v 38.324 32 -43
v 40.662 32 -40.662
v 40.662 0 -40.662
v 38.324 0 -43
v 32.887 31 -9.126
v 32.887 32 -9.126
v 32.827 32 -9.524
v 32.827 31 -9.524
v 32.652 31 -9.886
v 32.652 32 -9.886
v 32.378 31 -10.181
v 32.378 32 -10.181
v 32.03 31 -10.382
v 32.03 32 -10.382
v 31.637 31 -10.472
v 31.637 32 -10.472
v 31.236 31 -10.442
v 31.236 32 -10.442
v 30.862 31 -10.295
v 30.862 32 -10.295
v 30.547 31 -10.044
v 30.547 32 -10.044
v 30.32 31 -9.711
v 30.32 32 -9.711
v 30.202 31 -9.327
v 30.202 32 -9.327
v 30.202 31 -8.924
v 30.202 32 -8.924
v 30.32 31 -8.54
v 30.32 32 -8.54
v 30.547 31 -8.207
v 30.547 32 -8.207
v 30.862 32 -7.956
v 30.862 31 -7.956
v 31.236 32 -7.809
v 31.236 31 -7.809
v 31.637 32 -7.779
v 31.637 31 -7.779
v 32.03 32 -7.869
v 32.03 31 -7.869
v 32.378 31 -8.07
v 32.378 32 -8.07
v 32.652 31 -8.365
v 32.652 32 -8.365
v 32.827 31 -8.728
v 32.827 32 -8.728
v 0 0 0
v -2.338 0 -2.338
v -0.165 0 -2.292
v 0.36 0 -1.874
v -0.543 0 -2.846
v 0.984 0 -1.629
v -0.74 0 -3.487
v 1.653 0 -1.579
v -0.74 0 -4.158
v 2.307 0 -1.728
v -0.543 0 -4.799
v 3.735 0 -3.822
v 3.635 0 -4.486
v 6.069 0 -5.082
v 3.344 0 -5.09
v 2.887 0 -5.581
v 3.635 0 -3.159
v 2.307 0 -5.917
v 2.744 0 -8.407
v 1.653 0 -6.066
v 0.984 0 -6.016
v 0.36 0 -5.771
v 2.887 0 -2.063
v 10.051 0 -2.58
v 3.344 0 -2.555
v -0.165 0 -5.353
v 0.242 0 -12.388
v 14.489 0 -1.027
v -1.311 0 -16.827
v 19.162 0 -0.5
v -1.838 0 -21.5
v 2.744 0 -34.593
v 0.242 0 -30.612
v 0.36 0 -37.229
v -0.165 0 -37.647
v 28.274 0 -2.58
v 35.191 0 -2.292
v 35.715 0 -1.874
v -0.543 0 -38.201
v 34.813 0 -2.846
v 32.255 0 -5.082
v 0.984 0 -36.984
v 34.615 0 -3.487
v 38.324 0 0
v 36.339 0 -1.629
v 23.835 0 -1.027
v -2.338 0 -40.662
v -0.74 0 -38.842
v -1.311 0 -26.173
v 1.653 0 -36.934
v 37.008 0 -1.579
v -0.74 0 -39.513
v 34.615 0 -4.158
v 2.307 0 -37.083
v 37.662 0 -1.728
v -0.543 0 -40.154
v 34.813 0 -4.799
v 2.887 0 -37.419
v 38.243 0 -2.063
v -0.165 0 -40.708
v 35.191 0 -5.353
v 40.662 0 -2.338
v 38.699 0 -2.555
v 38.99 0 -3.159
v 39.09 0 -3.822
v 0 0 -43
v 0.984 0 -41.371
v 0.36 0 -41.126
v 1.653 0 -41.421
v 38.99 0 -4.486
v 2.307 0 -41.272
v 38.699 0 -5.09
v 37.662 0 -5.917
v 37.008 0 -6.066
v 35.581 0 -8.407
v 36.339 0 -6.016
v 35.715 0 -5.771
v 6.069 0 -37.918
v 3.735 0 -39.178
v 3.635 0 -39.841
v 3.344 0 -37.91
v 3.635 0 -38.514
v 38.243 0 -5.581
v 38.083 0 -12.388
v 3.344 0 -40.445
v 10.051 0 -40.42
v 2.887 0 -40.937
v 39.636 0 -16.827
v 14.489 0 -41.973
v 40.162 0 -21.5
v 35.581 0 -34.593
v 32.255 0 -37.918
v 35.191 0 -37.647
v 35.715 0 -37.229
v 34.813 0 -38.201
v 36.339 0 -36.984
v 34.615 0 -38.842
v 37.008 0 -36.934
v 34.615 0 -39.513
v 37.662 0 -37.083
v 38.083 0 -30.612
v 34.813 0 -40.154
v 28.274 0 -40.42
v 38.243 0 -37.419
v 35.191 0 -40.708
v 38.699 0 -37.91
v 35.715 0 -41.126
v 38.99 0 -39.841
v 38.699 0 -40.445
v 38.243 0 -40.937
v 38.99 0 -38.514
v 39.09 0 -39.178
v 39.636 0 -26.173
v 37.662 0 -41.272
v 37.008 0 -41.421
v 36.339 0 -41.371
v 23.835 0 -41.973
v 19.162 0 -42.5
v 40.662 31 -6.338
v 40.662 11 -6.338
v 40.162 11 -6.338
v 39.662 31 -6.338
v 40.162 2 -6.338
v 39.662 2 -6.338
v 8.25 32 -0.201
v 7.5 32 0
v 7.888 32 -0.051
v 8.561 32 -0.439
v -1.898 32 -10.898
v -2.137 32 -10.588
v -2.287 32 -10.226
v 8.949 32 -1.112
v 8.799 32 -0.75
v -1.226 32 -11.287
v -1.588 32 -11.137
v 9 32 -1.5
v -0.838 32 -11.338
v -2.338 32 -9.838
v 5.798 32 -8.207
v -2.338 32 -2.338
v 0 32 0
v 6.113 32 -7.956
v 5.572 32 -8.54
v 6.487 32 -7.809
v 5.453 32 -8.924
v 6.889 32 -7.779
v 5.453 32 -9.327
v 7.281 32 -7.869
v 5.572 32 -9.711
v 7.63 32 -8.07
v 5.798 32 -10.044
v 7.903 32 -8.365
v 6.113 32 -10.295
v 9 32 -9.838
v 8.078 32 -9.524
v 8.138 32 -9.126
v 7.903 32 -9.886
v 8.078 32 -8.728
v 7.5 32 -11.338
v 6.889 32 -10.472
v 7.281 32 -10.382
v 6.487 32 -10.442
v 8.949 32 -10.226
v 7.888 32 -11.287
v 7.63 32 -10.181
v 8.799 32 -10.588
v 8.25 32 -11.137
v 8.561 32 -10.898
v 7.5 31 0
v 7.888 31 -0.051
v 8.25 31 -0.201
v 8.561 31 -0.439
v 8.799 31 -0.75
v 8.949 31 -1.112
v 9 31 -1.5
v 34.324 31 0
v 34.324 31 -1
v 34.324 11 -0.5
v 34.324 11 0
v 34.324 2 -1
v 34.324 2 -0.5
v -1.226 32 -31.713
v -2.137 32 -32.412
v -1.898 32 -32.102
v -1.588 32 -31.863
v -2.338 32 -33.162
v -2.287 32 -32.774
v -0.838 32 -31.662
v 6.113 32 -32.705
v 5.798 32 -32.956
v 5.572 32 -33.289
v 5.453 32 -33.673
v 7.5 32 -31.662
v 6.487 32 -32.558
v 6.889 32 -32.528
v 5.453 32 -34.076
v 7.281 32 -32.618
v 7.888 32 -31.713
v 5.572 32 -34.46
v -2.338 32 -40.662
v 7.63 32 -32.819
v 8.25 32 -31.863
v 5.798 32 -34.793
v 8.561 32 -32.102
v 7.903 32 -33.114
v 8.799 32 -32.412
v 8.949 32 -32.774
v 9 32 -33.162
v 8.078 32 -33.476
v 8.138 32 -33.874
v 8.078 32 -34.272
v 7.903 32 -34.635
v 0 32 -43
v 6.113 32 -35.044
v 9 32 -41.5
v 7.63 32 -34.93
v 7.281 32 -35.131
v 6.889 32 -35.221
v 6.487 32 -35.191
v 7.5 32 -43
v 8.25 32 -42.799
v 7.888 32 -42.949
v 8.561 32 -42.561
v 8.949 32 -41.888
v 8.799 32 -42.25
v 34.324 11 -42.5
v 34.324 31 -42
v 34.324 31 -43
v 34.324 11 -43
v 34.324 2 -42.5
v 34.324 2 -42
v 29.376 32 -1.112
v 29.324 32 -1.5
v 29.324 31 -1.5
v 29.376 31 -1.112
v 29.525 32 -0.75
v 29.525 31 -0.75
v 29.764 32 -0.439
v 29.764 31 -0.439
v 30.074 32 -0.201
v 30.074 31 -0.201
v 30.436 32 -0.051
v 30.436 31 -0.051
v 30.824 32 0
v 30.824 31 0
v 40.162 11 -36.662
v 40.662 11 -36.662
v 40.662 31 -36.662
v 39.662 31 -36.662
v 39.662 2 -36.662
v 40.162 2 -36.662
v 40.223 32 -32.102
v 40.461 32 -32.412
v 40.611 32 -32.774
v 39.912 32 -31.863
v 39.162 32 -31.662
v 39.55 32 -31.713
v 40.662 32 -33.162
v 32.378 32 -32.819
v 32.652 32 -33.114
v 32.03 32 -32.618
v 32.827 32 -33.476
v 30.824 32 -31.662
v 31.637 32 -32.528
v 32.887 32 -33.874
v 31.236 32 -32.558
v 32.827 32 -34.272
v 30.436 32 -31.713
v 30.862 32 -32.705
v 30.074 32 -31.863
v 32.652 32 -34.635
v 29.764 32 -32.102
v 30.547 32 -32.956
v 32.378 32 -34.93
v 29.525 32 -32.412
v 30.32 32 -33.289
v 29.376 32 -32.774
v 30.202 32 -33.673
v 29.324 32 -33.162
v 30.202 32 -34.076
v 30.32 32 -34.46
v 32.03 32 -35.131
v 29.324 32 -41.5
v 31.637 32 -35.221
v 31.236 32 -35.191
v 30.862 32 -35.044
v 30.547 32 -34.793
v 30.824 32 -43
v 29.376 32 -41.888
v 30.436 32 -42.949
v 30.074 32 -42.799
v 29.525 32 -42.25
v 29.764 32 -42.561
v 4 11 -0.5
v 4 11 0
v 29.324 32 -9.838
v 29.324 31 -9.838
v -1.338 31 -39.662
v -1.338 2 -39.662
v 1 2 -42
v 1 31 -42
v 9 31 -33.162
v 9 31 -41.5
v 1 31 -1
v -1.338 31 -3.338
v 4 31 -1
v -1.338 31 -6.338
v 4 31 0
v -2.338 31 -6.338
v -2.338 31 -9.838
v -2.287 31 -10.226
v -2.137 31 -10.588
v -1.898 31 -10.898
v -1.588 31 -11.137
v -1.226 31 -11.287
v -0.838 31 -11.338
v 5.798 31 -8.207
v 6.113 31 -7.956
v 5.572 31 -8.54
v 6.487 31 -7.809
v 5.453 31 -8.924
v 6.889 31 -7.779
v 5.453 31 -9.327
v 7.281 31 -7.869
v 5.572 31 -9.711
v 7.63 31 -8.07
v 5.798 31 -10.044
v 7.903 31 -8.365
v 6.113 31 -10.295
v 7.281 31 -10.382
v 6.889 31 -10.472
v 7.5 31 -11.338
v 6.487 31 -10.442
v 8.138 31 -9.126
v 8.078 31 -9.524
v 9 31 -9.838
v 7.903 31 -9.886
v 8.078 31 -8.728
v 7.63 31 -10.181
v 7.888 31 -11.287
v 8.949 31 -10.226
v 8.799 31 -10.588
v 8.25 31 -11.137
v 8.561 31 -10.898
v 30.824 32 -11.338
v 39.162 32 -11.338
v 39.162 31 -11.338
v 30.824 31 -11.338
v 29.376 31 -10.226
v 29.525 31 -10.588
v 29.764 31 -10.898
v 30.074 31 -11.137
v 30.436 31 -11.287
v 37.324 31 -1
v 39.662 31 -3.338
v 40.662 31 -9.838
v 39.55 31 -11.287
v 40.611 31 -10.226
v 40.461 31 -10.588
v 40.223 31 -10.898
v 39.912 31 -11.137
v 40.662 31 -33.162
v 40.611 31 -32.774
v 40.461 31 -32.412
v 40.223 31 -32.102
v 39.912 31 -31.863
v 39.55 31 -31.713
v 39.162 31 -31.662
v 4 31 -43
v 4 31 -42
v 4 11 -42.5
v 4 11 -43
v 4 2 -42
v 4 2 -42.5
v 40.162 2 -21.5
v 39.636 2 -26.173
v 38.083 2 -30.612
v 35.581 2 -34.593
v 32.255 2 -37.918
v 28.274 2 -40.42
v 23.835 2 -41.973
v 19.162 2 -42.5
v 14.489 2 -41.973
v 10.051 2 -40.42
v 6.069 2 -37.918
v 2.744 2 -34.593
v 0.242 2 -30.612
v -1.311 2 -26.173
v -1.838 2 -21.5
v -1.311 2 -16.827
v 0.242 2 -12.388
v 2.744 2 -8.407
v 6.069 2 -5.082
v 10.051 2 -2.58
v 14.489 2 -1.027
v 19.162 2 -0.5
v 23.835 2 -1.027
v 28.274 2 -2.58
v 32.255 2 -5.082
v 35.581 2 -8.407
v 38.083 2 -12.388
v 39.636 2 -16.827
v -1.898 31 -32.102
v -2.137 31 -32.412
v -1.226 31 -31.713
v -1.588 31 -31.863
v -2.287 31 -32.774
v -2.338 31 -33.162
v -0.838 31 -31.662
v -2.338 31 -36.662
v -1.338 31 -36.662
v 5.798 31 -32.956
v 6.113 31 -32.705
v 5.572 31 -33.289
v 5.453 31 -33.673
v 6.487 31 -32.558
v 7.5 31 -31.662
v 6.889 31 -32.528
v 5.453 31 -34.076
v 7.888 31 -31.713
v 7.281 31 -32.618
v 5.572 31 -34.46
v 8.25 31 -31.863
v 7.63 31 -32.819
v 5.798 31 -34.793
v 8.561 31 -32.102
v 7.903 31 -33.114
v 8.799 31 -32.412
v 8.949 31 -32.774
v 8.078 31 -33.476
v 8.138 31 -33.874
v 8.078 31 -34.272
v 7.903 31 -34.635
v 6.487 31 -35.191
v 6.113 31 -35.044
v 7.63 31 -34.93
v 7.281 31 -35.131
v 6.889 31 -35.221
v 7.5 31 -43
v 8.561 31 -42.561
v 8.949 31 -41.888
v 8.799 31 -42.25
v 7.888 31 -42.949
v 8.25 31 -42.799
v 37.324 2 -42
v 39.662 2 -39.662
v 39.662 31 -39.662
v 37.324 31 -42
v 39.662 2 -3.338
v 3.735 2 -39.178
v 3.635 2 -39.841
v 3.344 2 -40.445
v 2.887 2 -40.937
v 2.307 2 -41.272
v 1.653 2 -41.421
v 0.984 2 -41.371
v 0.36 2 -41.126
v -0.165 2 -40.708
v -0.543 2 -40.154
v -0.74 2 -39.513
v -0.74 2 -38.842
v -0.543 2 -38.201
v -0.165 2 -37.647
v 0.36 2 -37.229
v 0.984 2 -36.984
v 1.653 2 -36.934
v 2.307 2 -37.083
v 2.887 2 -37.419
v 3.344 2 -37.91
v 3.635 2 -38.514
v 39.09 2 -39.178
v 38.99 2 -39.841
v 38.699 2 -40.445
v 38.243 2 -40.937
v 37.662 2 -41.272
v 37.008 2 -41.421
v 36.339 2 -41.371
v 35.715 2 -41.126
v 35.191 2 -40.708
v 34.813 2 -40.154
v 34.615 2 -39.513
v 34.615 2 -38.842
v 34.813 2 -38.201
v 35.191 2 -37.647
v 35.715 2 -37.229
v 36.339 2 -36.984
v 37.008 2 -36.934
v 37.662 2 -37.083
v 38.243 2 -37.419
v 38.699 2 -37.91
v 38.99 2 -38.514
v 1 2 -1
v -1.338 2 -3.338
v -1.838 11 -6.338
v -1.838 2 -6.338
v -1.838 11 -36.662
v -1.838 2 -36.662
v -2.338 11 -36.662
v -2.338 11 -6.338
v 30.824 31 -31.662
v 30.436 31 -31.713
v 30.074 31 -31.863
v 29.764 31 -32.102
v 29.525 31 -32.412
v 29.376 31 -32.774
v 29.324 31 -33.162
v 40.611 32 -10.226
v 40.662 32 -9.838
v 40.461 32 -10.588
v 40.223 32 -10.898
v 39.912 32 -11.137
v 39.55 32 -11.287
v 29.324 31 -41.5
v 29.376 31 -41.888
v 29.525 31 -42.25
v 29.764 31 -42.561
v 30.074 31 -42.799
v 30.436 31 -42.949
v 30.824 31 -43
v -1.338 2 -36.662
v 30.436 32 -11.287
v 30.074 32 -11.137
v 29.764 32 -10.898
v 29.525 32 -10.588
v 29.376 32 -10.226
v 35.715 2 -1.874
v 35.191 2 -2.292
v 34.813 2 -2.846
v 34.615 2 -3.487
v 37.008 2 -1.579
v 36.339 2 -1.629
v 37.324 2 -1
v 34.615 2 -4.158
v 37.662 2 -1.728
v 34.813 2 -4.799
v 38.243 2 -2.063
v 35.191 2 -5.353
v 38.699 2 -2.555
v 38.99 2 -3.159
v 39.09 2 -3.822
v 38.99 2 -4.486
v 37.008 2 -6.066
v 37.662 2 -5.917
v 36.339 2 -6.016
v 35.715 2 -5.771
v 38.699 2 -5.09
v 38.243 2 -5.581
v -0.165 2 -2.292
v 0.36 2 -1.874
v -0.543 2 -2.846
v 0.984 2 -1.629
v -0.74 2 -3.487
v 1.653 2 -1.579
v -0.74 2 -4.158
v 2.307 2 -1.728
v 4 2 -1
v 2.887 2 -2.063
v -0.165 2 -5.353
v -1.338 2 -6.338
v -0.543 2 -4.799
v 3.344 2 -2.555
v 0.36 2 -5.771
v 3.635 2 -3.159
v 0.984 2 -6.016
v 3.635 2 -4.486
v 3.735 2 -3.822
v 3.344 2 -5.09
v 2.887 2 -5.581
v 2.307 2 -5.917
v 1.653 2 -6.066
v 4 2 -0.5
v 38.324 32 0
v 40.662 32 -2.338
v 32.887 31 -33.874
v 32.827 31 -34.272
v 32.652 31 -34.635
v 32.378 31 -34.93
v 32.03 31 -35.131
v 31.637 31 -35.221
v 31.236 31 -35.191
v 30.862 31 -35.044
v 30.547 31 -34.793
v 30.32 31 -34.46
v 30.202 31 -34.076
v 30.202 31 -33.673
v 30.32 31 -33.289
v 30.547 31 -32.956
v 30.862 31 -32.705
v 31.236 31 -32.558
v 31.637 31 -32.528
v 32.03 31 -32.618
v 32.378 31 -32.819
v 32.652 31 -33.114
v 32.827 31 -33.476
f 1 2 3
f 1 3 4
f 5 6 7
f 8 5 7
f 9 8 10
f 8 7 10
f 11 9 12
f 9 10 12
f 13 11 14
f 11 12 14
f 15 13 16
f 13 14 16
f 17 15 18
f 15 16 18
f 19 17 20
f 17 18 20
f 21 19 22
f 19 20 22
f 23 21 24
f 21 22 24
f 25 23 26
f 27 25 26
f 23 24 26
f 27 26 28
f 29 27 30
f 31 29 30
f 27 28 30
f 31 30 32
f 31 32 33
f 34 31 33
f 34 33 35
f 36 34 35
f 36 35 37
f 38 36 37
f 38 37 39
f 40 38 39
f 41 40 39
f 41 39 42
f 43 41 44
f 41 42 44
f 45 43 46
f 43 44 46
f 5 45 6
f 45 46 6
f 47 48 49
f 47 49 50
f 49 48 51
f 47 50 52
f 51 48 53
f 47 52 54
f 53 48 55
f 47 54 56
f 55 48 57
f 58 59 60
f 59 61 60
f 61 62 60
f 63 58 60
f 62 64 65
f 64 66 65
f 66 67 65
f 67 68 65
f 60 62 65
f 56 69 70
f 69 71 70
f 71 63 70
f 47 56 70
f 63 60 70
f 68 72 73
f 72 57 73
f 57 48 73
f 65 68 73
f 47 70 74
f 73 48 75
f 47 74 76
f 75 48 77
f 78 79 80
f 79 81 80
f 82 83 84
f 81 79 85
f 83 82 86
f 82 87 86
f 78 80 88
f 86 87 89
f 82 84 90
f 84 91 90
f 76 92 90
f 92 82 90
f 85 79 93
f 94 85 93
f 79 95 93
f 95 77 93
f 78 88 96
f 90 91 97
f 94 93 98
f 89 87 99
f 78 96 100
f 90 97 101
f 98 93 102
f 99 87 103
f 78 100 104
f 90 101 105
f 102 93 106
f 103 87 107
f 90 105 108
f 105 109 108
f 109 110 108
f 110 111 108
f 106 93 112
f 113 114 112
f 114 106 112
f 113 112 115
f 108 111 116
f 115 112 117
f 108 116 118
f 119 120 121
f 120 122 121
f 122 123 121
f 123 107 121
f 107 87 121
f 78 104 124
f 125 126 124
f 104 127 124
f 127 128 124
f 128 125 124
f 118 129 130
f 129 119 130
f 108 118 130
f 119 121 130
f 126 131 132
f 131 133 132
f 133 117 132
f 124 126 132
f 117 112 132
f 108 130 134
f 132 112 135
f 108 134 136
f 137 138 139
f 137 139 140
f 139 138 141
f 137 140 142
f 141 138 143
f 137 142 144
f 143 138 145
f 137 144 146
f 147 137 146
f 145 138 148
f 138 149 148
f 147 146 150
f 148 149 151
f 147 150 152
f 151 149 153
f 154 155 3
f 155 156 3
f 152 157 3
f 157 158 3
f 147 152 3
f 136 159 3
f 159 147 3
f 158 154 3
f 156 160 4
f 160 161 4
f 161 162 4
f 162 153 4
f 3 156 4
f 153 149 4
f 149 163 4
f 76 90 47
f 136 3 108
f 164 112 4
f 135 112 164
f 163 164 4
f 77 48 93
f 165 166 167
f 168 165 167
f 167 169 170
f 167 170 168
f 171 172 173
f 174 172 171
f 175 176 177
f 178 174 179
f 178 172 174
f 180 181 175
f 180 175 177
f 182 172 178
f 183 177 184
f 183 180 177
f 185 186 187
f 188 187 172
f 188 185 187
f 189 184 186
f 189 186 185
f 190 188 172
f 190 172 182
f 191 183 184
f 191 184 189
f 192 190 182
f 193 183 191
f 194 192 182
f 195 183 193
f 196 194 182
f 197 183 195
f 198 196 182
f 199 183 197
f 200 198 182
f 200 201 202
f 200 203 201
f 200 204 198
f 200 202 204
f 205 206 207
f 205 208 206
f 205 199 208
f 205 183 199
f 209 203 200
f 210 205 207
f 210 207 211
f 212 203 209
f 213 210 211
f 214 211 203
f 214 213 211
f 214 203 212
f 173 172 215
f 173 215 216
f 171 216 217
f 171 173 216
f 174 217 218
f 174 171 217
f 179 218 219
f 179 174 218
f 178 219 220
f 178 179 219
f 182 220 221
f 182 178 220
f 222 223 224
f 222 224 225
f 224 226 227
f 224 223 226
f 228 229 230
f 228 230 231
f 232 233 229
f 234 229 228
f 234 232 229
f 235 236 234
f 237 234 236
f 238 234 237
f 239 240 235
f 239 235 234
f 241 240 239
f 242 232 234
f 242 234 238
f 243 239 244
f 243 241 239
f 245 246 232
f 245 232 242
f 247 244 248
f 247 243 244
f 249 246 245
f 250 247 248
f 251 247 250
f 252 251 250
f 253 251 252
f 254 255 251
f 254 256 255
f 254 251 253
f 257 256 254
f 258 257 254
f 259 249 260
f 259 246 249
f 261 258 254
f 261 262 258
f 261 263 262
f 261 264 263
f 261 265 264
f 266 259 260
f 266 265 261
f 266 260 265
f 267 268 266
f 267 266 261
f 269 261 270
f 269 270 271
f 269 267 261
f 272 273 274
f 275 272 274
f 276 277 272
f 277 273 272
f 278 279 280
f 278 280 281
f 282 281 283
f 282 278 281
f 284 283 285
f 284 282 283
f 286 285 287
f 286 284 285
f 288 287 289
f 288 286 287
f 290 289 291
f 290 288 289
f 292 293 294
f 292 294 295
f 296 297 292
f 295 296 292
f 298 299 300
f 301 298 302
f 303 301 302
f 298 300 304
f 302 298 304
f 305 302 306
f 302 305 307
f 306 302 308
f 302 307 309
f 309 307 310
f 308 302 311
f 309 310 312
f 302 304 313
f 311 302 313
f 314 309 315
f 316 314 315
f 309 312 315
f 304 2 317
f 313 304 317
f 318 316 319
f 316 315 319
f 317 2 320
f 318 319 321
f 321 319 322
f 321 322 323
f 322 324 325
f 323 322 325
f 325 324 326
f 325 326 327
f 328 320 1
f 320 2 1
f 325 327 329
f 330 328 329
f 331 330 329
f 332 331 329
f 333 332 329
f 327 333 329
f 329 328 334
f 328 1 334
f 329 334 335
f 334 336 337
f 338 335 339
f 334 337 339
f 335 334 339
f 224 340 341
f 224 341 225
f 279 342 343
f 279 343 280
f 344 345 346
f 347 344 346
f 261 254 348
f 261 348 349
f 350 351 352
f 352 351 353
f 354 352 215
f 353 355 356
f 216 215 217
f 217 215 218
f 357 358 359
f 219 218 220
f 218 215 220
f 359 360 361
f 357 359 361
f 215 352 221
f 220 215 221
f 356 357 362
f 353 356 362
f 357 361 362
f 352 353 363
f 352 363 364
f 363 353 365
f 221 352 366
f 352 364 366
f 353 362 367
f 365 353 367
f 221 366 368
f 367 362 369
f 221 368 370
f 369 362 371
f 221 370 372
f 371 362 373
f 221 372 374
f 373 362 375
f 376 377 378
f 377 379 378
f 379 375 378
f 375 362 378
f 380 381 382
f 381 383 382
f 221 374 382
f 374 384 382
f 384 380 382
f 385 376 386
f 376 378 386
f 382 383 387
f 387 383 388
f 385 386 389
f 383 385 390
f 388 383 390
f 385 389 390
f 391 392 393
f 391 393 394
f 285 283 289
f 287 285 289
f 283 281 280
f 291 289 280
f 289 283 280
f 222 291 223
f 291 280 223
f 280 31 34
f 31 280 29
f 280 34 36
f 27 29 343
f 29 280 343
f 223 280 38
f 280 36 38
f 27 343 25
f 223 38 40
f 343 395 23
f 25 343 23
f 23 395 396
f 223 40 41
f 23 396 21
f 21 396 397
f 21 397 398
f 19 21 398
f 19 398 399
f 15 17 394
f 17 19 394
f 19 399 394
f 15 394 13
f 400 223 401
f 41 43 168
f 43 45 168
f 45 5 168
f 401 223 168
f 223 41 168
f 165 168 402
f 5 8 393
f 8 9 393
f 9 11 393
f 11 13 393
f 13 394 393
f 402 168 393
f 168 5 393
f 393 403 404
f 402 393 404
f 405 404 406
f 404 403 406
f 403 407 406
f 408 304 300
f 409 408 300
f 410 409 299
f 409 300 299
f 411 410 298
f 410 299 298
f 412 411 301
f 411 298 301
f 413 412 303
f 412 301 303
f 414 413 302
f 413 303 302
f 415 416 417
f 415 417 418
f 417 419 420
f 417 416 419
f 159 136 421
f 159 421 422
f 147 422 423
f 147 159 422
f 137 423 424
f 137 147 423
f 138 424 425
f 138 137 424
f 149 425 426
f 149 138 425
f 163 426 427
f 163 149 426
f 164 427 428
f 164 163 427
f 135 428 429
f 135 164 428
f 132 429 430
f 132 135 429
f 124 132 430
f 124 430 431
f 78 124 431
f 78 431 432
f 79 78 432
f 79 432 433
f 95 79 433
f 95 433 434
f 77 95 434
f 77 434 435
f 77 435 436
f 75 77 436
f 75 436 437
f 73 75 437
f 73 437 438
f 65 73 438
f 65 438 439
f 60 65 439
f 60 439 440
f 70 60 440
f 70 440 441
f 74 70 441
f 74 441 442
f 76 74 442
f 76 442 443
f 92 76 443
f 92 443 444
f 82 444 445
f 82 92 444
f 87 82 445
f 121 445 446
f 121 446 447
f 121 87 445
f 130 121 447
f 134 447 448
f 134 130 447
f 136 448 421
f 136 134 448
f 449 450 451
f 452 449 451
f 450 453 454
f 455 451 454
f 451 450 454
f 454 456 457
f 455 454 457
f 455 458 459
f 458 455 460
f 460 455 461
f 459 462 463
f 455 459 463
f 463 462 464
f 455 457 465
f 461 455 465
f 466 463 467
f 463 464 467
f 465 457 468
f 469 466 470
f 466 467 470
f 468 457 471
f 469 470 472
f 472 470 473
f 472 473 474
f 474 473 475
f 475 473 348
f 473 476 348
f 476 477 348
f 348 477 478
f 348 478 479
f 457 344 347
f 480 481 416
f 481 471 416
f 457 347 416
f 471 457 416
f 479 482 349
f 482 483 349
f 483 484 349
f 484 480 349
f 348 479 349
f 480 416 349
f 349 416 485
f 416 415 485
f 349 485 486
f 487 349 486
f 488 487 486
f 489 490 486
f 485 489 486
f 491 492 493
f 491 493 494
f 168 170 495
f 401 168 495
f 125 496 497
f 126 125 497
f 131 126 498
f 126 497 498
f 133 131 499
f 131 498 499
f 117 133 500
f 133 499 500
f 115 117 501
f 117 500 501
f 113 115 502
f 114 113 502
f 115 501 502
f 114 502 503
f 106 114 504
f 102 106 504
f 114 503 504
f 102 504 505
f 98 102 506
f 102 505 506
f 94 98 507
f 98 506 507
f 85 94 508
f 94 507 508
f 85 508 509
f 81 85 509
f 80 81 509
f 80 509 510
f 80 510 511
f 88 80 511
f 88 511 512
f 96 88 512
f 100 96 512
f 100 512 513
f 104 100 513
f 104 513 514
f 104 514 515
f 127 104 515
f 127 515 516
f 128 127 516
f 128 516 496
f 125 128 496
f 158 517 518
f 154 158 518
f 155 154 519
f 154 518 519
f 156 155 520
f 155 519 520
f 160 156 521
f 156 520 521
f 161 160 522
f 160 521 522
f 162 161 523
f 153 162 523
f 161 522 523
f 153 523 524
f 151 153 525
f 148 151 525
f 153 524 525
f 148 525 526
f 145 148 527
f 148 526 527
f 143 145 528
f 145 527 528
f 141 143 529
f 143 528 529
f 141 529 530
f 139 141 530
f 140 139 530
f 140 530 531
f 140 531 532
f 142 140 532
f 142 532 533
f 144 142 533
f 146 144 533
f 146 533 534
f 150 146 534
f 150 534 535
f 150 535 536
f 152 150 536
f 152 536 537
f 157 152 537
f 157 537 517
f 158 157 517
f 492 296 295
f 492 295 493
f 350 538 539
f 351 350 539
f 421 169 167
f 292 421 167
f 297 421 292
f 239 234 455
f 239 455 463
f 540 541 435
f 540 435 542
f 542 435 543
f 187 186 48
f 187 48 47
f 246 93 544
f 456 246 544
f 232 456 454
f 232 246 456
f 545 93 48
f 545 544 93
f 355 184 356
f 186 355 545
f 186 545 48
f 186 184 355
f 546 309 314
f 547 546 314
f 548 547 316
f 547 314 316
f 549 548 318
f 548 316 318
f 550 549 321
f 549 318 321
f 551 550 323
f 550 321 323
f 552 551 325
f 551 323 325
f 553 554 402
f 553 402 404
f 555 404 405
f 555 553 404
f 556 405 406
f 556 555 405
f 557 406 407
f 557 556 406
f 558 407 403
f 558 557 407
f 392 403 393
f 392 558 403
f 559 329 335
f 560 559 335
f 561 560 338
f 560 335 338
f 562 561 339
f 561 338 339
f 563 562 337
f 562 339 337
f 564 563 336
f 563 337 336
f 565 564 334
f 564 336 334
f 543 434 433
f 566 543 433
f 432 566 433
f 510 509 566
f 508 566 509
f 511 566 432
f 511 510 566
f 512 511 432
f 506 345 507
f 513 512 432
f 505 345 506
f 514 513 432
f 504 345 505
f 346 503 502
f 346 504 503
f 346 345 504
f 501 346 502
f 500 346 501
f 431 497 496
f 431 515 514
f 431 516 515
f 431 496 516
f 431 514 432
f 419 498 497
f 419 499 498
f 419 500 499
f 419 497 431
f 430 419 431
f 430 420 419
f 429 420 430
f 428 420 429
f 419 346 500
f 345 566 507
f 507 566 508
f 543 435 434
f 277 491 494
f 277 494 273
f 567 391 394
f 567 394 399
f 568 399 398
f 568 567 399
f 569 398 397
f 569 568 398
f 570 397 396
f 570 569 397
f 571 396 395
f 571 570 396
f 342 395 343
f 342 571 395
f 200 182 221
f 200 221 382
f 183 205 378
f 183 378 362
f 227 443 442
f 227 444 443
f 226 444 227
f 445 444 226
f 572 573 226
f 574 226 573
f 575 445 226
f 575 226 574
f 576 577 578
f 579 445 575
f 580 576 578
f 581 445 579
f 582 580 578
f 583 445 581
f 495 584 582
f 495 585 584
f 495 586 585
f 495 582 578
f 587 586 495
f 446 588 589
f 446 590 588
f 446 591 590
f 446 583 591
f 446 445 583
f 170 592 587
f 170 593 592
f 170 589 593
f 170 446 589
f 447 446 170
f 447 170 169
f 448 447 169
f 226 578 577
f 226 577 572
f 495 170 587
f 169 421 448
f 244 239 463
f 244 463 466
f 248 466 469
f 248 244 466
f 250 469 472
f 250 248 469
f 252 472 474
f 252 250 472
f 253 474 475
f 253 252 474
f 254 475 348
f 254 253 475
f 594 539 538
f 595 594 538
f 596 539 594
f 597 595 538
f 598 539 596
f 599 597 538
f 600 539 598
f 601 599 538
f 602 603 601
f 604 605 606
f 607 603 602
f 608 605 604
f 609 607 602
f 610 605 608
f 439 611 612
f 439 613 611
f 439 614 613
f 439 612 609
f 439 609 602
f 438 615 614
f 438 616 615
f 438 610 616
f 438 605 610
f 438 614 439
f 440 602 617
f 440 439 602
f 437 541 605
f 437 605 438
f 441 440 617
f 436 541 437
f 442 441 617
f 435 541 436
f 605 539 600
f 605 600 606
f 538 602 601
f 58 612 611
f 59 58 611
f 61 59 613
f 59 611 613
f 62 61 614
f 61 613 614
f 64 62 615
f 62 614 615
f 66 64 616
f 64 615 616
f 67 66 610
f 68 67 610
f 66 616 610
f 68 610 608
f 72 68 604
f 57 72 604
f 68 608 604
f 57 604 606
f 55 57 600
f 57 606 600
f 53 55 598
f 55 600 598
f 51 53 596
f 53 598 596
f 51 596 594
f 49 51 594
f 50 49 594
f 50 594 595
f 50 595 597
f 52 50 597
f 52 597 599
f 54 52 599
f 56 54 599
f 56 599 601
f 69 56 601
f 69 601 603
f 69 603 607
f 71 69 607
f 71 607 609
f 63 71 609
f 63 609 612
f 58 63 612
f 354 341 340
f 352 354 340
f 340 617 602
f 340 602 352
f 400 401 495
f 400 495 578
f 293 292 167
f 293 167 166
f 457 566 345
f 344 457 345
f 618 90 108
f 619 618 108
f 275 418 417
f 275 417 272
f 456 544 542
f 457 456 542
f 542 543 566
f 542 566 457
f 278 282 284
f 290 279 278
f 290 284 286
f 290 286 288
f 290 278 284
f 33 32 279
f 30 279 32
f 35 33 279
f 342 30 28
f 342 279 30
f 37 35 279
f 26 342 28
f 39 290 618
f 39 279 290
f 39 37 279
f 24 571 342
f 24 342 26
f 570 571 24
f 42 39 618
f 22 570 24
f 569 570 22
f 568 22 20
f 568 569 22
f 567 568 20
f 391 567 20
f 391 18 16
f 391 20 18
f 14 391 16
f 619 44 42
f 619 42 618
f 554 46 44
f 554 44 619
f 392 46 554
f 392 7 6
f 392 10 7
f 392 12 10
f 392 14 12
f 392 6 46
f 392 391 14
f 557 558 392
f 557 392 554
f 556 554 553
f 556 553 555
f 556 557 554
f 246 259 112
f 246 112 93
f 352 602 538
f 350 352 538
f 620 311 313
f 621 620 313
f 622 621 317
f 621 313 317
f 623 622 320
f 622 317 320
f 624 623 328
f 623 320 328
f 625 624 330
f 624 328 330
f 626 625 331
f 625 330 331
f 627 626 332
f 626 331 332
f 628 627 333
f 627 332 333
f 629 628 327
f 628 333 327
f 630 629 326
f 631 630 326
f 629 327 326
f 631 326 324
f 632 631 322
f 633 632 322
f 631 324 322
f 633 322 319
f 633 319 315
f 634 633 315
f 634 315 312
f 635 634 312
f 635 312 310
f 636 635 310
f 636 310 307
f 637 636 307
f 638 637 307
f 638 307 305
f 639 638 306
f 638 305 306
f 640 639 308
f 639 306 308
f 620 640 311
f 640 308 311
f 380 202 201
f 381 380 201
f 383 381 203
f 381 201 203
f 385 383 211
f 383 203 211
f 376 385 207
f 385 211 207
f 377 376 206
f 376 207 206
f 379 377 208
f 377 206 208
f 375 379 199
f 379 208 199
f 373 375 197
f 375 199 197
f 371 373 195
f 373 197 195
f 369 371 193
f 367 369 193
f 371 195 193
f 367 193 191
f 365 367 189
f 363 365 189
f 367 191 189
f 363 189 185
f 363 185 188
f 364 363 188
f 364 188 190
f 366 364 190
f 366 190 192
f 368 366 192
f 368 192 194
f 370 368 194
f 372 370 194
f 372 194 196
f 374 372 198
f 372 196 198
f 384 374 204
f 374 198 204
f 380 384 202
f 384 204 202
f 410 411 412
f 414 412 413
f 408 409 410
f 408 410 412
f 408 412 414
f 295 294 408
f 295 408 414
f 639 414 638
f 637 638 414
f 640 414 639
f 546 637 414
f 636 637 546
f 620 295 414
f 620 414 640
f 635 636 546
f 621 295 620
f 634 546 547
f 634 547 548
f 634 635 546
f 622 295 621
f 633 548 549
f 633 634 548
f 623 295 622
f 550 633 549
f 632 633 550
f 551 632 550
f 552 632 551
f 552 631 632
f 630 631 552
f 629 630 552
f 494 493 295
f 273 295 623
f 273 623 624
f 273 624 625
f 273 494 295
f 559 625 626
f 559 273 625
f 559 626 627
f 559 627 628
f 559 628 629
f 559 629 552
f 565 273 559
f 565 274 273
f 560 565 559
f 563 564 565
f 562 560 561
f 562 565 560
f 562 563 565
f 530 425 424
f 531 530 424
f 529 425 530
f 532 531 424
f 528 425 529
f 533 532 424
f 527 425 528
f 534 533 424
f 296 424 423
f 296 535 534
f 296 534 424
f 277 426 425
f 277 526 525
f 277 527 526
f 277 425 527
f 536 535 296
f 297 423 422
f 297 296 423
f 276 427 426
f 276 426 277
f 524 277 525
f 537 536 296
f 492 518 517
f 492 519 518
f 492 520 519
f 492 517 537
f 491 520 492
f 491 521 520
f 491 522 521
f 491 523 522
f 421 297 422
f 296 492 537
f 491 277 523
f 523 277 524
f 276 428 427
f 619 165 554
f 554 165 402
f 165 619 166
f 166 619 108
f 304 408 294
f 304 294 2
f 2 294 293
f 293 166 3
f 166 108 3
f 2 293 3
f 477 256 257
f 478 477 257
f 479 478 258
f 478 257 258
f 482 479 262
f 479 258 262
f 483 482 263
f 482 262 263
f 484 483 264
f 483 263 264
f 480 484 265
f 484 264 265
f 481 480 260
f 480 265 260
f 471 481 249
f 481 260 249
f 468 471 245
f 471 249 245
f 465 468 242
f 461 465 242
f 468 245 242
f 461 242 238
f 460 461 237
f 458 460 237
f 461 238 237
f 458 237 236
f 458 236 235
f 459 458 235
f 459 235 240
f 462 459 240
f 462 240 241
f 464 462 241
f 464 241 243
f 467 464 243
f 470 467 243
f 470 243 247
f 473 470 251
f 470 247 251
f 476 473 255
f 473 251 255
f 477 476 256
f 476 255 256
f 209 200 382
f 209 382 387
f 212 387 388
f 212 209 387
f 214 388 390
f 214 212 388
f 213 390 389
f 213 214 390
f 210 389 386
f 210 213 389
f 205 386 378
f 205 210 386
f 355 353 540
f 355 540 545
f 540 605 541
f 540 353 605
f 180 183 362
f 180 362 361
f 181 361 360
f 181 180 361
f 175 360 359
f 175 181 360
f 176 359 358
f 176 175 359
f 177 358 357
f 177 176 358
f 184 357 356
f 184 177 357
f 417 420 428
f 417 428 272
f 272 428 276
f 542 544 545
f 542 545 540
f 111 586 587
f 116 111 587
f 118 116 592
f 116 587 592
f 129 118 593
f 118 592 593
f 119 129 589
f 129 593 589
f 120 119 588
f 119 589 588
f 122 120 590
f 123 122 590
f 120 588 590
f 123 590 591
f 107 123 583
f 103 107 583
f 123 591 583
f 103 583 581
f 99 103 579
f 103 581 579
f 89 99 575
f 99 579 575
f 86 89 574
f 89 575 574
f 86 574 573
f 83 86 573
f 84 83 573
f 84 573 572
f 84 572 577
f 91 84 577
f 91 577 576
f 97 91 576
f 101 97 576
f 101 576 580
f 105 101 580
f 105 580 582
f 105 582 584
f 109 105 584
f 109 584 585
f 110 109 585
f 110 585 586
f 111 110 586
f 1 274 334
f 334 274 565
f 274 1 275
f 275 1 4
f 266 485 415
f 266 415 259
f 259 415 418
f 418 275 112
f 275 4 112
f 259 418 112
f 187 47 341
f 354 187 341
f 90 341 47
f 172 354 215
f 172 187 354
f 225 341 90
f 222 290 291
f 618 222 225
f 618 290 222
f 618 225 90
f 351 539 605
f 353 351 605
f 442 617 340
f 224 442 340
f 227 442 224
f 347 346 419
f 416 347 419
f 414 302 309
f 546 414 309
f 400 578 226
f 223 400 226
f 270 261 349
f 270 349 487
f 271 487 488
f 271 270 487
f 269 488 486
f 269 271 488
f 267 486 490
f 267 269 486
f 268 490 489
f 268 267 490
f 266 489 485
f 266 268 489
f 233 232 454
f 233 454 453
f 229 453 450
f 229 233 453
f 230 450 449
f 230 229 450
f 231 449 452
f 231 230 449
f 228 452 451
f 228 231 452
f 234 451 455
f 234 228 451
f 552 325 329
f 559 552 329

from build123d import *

# Parameters (mm, degrees)
SKETCH1_R           = 21
BOSS_EXTRUDE1_DEPTH = 2
BOSS_EXTRUDE6_DEPTH = 30
SKETCH13_W          = 30.324405
SKETCH13_H          = 0.5
SKETCH13_W_2        = 0.5
SKETCH13_H_2        = 30.324404
SKETCH13_W_3        = 30.32440476
SKETCH13_H_3        = 0.50000019
BOSS_EXTRUDE7_DEPTH = 9
SKETCH15_R          = 1.35
BOSS_EXTRUDE9_DEPTH = 1
SKETCH16_R          = 2.25
CUT_EXTRUDE1_DEPTH  = 3


with BuildPart() as part:
    # Sketch1 → Boss-Extrude1 (new body)
    with BuildSketch(Plane(origin=(0, 0, 0), x_dir=(1, 0, 0), z_dir=(0, 1, 0))):
        Polygon((0, 0), (38.32440476, 0), (40.66220238, 2.33779762), (40.66220238, 40.66220238), (38.32440476, 43), (0, 43), (-2.33779762, 40.66220238), (-2.33779762, 2.33779762), align=None)
        with Locations((19.16220238, 21.5)):
            Circle(SKETCH1_R, mode=Mode.SUBTRACT)
    extrude(amount=BOSS_EXTRUDE1_DEPTH)

    # Sketch3 → Boss-Extrude6 (add)
    with BuildSketch(Plane(origin=(0, 2, 0), x_dir=(1, 0, 0), z_dir=(0, 1, 0))):
        Polygon((34.324405, 1), (34.324405, 0), (38.32440476, 0), (40.66220238, 2.33779762), (40.66220238, 6.337798), (39.66220238, 6.337798), (39.66220238, 3.33779738), (37.324405, 1), align=None)
        Polygon((-2.33779762, 2.33779762), (0, 0), (4, 0), (4, 1), (1, 1), (-1.33779762, 3.337798), (-1.33779762, 6.337798), (-2.33779762, 6.337798), align=None)
        Polygon((-2.33779762, 40.66220238), (-2.33779762, 36.662202), (-1.33779762, 36.662202), (-1.33779762, 39.662202), (1, 41.99999962), (4, 41.99999962), (4, 43), (0, 43), align=None)
        Polygon((39.66220238, 39.662202), (37.32440476, 41.99999962), (34.32440476, 41.99999962), (34.32440476, 43), (38.32440476, 43), (40.66220238, 40.66220238), (40.66220238, 36.662202), (39.66220238, 36.662202), align=None)
    extrude(amount=BOSS_EXTRUDE6_DEPTH)

    # Sketch13 → Boss-Extrude7 (add)
    with BuildSketch(Plane(origin=(0, 2, 0), x_dir=(1, 0, 0), z_dir=(0, 1, 0))):
        with Locations((19.1622025, 0.25)):
            Rectangle(SKETCH13_W, SKETCH13_H)
        with Locations((-2.08779762, 21.5)):
            Rectangle(SKETCH13_W_2, SKETCH13_H_2)
        with Locations((40.41220238, 21.5)):
            Rectangle(SKETCH13_W_2, SKETCH13_H_2)
        with Locations((19.16220238, 42.749999905)):
            Rectangle(SKETCH13_W_3, SKETCH13_H_3)
    extrude(amount=BOSS_EXTRUDE7_DEPTH)

    # Sketch15 → Boss-Extrude9 (add)
    with BuildSketch(Plane(origin=(0, 32, 0), x_dir=(1, 0, 0), z_dir=(0, 1, 0))):
        with BuildLine():
            Line((4, 0), (7.5, 0))
            ThreePointArc((7.5, 0), (8.560660172, 0.439339828), (9, 1.5))
            Line((9, 1.5), (9, 9.837798))
            ThreePointArc((9, 9.837798), (8.560660172, 10.898458172), (7.5, 11.337798))
            Line((7.5, 11.337798), (-0.83779762, 11.337798))
            ThreePointArc((-0.83779762, 11.337798), (-1.898457792, 10.898458172), (-2.33779762, 9.837798))
            Line((-2.33779762, 9.837798), (-2.33779762, 6.337798))
            Line((-2.33779762, 6.337798), (-2.33779762, 2.33779762))
            Line((-2.33779762, 2.33779762), (0, 0))
            Line((0, 0), (4, 0))
        make_face()
        with Locations((6.78783338, 9.125631)):
            Circle(SKETCH15_R, mode=Mode.SUBTRACT)
        with BuildLine():
            Line((39.16220238, 11.337798), (30.82440476, 11.337798))
            ThreePointArc((30.82440476, 11.337798), (29.763744588, 10.898458172), (29.32440476, 9.837798))
            Line((29.32440476, 9.837798), (29.32440476, 1.5))
            ThreePointArc((29.32440476, 1.5), (29.763744588, 0.439339828), (30.82440476, 0))
            Line((30.82440476, 0), (34.32440476, 0))
            Line((34.32440476, 0), (38.32440476, 0))
            Line((38.32440476, 0), (40.66220238, 2.33779762))
            Line((40.66220238, 2.33779762), (40.66220238, 6.337798))
            Line((40.66220238, 6.337798), (40.66220238, 9.837798))
            ThreePointArc((40.66220238, 9.837798), (40.222862552, 10.898458172), (39.16220238, 11.337798))
        make_face()
        with Locations((31.53657138, 9.125631)):
            Circle(SKETCH15_R, mode=Mode.SUBTRACT)
        with BuildLine():
            Line((-0.83779762, 31.662202), (7.5, 31.662202))
            ThreePointArc((7.5, 31.662202), (8.560660172, 32.101541828), (9, 33.162202))
            Line((9, 33.162202), (9, 41.5))
            ThreePointArc((9, 41.5), (8.560660172, 42.560660171), (7.5, 43))
            Line((7.5, 43), (4, 43))
            Line((4, 43), (0, 43))
            Line((0, 43), (-2.33779762, 40.66220238))
            Line((-2.33779762, 40.66220238), (-2.33779762, 36.662202))
            Line((-2.33779762, 36.662202), (-2.33779762, 33.162202))
            ThreePointArc((-2.33779762, 33.162202), (-1.898457792, 32.101541828), (-0.83779762, 31.662202))
        make_face()
        with Locations((6.78783338, 33.874369)):
            Circle(SKETCH15_R, mode=Mode.SUBTRACT)
        with BuildLine():
            Line((40.66220238, 36.662202), (40.66220238, 33.162202))
            ThreePointArc((40.66220238, 33.162202), (40.222862552, 32.101541828), (39.16220238, 31.662202))
            Line((39.16220238, 31.662202), (30.82440476, 31.662202))
            ThreePointArc((30.82440476, 31.662202), (29.763744588, 32.101541828), (29.32440476, 33.162202))
            Line((29.32440476, 33.162202), (29.32440476, 41.5))
            ThreePointArc((29.32440476, 41.5), (29.763744588, 42.560660171), (30.82440476, 43))
            Line((30.82440476, 43), (34.32440476, 43))
            Line((34.32440476, 43), (38.32440476, 43))
            Line((38.32440476, 43), (40.66220238, 40.66220238))
            Line((40.66220238, 40.66220238), (40.66220238, 36.662202))
        make_face()
        with Locations((31.53657138, 33.874369)):
            Circle(SKETCH15_R, mode=Mode.SUBTRACT)
    extrude(amount=-BOSS_EXTRUDE9_DEPTH)

    # Sketch16 → Cut-Extrude1 (cut, through all)
    with BuildSketch(Plane(origin=(0, 2, 0), x_dir=(1, 0, 0), z_dir=(0, 1, 0))):
        with Locations((36.83987191, 39.177669529)):
            Circle(SKETCH16_R)
        with Locations((36.83987191, 3.82233047)):
            Circle(SKETCH16_R)
        with Locations((1.48453285, 3.82233047)):
            Circle(SKETCH16_R)
        with Locations((1.48453285, 39.177669529)):
            Circle(SKETCH16_R)
    extrude(amount=-CUT_EXTRUDE1_DEPTH, mode=Mode.SUBTRACT)


solid = part.part
